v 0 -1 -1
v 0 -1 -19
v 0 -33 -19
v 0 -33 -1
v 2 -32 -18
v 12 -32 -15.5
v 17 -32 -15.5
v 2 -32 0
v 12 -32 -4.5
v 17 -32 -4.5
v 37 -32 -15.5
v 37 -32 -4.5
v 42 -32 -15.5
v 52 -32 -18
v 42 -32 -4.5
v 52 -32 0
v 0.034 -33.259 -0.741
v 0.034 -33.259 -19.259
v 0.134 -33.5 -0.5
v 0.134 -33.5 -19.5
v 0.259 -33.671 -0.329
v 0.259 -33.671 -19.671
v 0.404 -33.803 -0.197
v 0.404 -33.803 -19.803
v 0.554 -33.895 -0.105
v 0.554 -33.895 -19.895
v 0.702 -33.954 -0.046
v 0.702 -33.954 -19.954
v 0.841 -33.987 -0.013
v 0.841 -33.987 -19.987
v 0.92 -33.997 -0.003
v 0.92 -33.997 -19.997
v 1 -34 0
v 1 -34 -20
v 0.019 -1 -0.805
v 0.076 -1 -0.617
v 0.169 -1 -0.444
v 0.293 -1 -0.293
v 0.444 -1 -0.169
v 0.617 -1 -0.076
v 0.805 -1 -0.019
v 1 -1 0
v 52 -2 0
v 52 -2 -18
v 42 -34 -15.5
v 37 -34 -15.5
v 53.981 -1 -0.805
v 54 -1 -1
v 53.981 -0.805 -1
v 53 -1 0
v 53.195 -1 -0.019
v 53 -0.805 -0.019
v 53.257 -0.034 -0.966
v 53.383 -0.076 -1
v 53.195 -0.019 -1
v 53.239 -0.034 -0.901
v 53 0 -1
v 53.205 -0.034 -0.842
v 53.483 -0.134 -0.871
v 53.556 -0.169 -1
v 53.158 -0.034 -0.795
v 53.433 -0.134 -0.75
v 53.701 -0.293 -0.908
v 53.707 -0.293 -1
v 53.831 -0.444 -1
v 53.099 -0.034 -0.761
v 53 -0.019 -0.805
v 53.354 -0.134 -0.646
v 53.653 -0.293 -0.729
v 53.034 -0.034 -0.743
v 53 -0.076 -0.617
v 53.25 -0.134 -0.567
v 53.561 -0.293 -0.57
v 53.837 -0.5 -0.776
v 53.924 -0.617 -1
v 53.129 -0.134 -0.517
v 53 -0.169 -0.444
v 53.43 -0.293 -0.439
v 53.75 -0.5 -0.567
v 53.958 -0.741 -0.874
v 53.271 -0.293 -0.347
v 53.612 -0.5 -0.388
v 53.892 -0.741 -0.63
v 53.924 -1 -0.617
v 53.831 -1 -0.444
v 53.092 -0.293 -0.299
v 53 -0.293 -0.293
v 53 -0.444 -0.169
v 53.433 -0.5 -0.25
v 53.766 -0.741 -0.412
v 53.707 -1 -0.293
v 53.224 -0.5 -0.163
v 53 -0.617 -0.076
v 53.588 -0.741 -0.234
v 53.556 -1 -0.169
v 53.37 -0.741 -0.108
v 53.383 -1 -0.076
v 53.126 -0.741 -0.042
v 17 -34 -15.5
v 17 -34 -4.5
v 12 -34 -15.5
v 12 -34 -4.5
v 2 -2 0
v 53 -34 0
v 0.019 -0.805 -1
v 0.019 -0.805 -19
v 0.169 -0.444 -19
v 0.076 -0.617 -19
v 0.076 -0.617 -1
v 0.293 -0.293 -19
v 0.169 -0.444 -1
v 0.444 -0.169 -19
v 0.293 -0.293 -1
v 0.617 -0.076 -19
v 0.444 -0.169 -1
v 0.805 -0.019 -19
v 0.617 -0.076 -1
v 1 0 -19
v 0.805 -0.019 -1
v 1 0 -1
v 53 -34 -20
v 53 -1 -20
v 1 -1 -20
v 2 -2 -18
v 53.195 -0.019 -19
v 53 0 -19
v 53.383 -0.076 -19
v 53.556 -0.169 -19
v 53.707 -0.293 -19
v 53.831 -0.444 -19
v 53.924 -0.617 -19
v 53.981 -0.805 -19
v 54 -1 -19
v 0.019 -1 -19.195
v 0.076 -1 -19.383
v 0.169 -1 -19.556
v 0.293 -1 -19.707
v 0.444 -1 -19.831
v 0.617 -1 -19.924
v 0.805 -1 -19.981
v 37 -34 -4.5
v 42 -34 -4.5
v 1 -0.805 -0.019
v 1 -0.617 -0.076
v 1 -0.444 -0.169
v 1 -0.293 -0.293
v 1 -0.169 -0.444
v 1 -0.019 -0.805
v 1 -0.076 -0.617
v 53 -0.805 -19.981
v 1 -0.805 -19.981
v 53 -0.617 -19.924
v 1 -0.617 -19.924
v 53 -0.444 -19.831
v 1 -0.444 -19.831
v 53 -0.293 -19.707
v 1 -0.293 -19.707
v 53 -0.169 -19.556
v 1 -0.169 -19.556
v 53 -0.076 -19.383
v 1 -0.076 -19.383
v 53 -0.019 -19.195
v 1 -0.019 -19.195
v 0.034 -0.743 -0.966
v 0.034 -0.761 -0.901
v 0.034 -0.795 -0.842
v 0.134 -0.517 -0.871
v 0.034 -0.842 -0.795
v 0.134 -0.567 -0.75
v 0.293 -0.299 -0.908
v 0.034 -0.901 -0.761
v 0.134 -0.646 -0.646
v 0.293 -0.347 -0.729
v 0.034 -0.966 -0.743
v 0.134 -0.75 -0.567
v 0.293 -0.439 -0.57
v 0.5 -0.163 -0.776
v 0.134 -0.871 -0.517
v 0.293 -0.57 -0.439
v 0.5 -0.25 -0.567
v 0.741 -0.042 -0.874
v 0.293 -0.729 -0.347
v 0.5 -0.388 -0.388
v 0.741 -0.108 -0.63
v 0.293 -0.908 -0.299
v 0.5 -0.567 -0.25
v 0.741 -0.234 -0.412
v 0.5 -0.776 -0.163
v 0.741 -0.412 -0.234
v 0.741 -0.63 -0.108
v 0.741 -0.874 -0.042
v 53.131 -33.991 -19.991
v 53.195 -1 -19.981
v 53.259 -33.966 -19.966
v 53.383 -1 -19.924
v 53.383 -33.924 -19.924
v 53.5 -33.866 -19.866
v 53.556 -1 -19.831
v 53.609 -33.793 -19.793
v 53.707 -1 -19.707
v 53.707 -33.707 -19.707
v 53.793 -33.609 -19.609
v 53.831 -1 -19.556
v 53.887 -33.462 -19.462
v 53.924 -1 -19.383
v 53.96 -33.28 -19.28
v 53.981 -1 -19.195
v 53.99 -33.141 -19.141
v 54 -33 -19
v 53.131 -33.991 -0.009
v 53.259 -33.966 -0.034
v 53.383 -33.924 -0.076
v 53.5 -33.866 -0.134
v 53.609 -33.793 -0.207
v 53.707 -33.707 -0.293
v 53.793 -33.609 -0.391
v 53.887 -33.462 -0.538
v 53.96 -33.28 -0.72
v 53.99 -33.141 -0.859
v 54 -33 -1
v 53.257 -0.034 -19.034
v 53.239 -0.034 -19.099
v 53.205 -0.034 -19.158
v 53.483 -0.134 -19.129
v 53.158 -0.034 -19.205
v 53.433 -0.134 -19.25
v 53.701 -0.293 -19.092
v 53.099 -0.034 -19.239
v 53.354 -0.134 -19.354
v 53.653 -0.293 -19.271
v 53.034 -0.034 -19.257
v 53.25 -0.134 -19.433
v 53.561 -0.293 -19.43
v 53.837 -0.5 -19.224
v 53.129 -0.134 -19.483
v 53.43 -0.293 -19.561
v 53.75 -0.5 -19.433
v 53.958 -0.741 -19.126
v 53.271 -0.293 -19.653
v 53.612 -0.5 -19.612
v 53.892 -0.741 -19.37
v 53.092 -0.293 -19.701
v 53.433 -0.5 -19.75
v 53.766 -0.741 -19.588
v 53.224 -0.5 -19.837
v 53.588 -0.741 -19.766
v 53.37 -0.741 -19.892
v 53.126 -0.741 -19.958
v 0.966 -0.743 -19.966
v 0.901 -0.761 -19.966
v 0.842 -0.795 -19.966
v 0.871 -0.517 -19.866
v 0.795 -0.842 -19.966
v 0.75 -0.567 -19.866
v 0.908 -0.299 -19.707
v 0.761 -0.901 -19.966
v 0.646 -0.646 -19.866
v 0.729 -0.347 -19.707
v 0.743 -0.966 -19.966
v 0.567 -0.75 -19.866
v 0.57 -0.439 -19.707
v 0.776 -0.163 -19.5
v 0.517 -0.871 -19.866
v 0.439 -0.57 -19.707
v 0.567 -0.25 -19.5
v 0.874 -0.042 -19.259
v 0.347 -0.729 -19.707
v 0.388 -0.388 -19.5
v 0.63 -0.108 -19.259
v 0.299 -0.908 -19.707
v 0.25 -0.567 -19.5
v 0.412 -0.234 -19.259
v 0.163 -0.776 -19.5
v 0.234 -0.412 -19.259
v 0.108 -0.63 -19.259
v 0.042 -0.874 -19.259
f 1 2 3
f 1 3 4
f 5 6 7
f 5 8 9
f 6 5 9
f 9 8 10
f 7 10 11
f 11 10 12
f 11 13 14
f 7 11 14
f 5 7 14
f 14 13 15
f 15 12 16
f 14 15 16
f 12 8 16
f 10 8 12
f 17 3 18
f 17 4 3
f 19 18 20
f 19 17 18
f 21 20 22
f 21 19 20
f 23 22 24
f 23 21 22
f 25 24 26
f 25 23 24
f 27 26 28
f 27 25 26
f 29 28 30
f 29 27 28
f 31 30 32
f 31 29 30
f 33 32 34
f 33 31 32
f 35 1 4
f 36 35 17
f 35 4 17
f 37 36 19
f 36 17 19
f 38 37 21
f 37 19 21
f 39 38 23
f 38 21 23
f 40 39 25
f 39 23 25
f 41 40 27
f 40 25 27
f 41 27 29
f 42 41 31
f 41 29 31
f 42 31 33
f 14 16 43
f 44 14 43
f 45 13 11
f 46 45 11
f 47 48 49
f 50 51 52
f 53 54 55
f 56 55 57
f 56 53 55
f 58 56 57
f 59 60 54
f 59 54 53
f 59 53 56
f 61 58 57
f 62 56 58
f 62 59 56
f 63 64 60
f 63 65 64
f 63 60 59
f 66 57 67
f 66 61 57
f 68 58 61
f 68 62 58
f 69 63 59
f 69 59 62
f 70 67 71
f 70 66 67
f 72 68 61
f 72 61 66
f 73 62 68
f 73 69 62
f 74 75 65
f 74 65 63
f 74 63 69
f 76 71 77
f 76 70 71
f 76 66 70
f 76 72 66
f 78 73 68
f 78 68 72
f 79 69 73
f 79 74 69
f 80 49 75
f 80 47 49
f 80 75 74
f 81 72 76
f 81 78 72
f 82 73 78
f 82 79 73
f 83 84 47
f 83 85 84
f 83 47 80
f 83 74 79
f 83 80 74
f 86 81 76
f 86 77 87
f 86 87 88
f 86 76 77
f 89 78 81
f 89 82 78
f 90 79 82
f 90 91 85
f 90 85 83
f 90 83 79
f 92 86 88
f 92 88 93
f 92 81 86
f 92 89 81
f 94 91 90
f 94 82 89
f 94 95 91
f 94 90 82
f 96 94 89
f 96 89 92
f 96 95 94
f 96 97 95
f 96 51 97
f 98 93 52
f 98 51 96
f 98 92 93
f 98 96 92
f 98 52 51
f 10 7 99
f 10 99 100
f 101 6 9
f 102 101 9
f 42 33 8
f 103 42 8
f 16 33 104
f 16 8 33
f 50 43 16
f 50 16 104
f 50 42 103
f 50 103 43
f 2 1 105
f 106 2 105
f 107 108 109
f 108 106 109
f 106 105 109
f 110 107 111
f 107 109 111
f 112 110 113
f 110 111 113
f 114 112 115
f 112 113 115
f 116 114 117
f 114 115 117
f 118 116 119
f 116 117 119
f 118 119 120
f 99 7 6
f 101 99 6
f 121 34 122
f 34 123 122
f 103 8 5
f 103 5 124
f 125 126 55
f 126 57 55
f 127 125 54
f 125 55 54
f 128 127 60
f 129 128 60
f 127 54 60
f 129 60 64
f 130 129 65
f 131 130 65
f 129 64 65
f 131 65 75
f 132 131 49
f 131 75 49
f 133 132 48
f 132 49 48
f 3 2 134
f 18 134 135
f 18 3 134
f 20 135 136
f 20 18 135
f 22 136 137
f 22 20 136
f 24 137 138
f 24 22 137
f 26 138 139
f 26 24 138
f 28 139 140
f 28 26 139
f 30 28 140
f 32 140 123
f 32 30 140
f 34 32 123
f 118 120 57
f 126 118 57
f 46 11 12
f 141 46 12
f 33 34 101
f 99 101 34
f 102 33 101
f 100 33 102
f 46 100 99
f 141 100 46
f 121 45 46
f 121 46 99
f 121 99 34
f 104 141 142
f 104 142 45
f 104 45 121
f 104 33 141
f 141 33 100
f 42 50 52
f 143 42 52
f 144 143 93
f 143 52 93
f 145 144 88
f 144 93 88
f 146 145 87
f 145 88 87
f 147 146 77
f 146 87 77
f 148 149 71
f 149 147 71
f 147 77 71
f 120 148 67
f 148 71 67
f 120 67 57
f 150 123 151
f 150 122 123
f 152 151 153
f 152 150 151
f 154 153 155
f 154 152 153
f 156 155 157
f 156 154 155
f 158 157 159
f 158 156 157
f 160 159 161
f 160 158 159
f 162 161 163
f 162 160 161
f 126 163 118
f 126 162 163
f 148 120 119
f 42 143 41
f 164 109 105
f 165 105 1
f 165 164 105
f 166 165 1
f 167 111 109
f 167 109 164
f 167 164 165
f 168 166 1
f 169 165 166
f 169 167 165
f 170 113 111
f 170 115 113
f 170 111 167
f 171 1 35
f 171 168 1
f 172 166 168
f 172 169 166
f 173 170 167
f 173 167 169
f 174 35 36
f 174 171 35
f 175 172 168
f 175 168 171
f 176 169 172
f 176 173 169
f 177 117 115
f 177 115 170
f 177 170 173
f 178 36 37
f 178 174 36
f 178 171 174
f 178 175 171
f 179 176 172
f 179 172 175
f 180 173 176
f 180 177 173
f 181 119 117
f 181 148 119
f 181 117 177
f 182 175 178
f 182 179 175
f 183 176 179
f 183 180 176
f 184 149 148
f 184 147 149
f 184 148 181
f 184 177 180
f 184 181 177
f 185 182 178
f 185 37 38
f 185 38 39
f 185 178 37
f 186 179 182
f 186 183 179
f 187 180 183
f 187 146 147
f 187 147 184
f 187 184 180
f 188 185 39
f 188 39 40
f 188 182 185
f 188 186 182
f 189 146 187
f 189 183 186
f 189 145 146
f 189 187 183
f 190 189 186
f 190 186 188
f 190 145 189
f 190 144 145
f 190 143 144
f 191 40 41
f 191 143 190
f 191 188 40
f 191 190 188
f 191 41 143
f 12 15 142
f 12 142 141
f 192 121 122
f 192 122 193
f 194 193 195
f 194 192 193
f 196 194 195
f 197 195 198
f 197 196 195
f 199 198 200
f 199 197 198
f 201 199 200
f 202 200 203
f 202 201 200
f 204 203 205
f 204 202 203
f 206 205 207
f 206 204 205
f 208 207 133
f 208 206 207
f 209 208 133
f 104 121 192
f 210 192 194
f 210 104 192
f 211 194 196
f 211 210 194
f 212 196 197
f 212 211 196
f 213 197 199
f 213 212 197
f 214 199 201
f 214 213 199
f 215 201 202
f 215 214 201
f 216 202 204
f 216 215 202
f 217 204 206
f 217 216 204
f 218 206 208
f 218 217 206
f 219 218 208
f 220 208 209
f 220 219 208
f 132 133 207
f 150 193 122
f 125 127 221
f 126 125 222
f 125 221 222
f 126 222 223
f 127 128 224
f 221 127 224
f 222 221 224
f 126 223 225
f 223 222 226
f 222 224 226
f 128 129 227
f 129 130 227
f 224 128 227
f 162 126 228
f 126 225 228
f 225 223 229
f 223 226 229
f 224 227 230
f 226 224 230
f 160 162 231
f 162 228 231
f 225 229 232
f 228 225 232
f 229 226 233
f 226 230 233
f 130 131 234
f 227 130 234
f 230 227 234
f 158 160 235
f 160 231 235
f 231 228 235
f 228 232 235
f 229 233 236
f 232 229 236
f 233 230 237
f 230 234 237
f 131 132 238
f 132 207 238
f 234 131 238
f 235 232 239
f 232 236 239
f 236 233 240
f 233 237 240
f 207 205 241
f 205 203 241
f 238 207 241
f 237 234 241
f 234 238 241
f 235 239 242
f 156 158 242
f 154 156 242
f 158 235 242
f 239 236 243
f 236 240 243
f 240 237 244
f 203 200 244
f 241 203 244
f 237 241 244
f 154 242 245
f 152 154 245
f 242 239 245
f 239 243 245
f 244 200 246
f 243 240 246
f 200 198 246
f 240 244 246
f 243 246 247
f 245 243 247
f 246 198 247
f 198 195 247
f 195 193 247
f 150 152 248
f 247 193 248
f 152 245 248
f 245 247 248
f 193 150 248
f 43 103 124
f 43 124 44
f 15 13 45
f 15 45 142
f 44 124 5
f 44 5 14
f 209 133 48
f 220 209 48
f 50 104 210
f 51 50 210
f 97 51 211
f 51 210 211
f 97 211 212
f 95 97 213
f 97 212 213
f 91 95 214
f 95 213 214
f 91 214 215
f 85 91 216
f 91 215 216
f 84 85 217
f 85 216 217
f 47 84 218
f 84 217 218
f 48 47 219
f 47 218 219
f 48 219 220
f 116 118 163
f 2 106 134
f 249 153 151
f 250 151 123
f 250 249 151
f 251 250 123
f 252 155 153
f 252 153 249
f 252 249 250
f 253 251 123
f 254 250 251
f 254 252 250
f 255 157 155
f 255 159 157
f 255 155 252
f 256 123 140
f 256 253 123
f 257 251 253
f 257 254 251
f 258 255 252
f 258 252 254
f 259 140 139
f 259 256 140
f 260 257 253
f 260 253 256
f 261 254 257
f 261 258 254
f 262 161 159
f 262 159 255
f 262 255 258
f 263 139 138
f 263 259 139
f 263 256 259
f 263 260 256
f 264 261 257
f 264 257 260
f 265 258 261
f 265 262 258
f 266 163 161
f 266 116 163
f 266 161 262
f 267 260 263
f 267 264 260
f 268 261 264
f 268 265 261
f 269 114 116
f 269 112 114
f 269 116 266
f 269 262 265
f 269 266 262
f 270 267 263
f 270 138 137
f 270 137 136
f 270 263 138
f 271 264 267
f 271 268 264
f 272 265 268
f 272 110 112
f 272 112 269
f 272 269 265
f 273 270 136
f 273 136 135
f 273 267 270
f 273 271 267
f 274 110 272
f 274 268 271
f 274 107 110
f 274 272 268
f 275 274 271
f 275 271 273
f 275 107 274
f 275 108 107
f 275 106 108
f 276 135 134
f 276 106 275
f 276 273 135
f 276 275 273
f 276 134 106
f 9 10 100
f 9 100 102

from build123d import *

# Parameters (mm, degrees)
F0_W     = 54
F0_H     = 20
F1_DEPTH = 34
F2_W     = 50
F2_H     = 30
F3_DEPTH = 18
F5_W     = 5
F5_H     = 11
F6_DEPTH = 5
F7_R     = 1


with BuildPart() as f1:
    # F0 (on Front) → F1 (new body)
    with BuildSketch(Plane.XZ):
        with Locations((27, -10)):
            Rectangle(F0_W, F0_H)
    extrude(amount=F1_DEPTH)

    # F2 (on Top) → F3 (cut)
    with BuildSketch(Plane.XY):
        with Locations((27, -17)):
            Rectangle(F2_W, F2_H)
    extrude(amount=-F3_DEPTH, mode=Mode.SUBTRACT)

    # F5 (on offset) → F6 (cut)
    with BuildSketch(Plane(origin=(0, -32, 0), x_dir=(-1, 0, 0), z_dir=(0, 1, 0))):
        with Locations((-14.5, -10)):
            Rectangle(F5_W, F5_H)
        with Locations((-39.5, -9.9999997467)):
            Rectangle(F5_W, F5_H)
    extrude(amount=-F6_DEPTH, mode=Mode.SUBTRACT)

    # F7
    f7_edges = [f1.edges().sort_by_distance(p)[0] for p in [
        (54, -17, -20),
        (54, -17, 0),
        (54, 0, -10),
        (54, -34, -10),
        (27, 0, 0),
        (0, 0, -10),
        (27, 0, -20),
        (0, -17, 0),
        (0, -17, -20),
        (0, -34, -10),
    ]]
    fillet(f7_edges, radius=F7_R)


solid = f1.part
